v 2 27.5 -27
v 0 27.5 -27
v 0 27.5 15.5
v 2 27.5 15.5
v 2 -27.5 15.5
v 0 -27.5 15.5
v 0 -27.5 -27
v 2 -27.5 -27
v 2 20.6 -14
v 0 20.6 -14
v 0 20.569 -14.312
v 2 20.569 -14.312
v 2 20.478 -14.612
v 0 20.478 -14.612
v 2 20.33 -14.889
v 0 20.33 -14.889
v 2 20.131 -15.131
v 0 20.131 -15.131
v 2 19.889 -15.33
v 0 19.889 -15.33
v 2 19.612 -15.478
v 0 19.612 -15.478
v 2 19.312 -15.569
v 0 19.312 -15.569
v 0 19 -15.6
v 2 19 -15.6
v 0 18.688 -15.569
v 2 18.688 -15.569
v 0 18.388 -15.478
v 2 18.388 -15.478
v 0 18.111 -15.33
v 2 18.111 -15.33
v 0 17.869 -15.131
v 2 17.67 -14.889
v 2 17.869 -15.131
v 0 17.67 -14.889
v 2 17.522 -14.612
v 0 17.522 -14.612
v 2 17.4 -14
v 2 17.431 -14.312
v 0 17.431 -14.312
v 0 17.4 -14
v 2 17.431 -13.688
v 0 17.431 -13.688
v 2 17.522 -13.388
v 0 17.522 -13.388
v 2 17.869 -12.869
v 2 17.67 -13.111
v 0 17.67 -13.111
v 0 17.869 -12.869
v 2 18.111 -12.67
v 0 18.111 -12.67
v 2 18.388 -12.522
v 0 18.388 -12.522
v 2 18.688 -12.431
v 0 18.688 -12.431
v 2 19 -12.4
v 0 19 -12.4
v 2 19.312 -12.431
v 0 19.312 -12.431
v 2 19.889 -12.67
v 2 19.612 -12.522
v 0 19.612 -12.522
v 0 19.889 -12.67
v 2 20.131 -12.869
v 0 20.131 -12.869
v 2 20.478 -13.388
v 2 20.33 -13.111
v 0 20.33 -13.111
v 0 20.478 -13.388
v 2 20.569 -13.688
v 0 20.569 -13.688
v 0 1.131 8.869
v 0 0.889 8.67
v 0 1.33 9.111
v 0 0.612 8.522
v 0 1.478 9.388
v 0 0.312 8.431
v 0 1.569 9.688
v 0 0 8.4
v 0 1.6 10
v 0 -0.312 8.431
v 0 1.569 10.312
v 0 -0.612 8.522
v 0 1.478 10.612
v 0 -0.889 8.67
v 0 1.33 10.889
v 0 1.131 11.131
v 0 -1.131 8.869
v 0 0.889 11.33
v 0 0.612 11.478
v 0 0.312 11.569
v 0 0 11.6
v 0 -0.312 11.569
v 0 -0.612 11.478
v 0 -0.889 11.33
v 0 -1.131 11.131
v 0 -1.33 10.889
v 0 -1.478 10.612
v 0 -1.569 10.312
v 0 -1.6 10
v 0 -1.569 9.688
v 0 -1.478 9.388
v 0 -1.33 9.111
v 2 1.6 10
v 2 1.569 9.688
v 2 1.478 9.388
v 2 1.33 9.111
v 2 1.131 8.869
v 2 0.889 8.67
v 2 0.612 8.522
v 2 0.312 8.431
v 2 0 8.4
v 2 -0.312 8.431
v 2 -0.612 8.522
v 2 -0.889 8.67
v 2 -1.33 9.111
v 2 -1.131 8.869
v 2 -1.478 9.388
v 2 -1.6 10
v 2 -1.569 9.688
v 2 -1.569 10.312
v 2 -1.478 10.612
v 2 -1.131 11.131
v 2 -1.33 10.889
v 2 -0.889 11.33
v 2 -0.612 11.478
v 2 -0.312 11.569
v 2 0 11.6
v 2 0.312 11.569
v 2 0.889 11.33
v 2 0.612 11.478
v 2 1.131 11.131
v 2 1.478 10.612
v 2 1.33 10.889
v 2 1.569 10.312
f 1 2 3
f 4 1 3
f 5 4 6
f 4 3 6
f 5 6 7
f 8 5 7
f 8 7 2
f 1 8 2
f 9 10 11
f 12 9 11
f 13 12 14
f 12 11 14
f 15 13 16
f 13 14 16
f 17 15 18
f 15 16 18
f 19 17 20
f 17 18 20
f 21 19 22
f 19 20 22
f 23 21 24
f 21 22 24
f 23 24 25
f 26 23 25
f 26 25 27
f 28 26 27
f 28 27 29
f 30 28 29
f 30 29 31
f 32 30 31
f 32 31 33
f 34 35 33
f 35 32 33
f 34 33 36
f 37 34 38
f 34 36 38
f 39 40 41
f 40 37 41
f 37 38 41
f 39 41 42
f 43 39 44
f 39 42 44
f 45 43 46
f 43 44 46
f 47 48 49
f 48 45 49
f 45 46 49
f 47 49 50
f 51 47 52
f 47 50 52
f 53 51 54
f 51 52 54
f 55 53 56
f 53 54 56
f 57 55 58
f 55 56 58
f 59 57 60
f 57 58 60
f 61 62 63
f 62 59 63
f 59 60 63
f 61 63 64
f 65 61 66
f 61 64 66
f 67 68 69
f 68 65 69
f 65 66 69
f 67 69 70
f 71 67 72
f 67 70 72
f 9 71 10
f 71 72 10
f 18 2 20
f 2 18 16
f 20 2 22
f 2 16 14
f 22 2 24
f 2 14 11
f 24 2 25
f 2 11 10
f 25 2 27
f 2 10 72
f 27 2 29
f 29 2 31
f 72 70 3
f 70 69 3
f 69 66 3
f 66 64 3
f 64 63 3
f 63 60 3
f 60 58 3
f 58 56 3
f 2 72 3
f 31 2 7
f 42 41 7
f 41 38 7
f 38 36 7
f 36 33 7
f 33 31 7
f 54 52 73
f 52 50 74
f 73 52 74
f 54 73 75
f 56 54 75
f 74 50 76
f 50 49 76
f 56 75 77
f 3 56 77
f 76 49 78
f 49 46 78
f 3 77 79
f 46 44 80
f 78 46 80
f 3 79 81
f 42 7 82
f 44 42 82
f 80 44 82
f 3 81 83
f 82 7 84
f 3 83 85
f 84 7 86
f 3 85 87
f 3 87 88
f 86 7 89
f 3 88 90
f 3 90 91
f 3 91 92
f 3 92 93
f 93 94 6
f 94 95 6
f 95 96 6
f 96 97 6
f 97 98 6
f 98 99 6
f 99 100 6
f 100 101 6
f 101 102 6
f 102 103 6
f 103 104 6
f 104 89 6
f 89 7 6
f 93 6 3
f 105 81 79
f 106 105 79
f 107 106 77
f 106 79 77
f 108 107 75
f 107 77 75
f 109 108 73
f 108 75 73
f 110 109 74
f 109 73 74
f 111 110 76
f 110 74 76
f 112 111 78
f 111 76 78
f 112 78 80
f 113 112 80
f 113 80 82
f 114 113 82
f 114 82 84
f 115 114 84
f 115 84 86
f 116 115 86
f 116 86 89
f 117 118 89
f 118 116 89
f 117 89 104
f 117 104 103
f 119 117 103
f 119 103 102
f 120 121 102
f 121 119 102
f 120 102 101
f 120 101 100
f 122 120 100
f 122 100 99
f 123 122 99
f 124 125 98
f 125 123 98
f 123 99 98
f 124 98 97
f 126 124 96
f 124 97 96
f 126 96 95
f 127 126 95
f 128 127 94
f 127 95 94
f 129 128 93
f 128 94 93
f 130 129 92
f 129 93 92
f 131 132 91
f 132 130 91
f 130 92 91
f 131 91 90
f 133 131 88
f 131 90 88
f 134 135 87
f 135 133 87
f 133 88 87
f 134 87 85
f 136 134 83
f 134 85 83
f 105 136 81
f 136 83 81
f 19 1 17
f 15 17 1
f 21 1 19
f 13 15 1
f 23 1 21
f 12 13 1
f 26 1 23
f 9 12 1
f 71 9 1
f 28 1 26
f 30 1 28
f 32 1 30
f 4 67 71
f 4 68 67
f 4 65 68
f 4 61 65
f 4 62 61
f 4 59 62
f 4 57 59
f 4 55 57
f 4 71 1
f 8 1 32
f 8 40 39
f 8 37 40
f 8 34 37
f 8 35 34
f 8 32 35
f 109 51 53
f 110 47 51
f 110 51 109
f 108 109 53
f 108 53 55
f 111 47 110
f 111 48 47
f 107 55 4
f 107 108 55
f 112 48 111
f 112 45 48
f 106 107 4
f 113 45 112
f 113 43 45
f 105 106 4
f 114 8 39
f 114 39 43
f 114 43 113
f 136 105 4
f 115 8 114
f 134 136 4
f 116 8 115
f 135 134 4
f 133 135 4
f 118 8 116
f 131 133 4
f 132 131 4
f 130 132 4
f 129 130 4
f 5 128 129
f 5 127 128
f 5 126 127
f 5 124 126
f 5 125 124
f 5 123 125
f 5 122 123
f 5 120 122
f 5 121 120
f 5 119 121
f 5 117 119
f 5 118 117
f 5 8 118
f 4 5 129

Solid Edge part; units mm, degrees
sketch "Sketch1" plane through (0, 0, 0) normal (1, 0, 0) x (0, 1, 0)
  line L0 (27.5, -27) -> (27.5, 15.5)
  line L1 (27.5, 15.5) -> (-27.5, 15.5)
  line L2 (-27.5, 15.5) -> (-27.5, -27)
  line L3 (-27.5, -27) -> (27.5, -27)
extrude "Protrusion1" add sketch "Sketch1" along normal blind 2
sketch "Sketch2" plane through (0, 0, 0) normal (1, 0, 0) x (0, 1, 0)
  circle A0 centre (0, 10) radius 1.6
  circle A1 centre (19, -14) radius 1.6
  dimension "D1" = 3.2
  dimension "D2" = 3.2
  dimension "D3" = 3.5
  dimension "D4" = 3.5
  dimension "D5" = 3.5
  dimension "D6" = 3.5
extrude "ExtrudedCutout_7" cut sketch "Sketch2" along normal blind 2
properties material "ABS Plastic, high impact"
